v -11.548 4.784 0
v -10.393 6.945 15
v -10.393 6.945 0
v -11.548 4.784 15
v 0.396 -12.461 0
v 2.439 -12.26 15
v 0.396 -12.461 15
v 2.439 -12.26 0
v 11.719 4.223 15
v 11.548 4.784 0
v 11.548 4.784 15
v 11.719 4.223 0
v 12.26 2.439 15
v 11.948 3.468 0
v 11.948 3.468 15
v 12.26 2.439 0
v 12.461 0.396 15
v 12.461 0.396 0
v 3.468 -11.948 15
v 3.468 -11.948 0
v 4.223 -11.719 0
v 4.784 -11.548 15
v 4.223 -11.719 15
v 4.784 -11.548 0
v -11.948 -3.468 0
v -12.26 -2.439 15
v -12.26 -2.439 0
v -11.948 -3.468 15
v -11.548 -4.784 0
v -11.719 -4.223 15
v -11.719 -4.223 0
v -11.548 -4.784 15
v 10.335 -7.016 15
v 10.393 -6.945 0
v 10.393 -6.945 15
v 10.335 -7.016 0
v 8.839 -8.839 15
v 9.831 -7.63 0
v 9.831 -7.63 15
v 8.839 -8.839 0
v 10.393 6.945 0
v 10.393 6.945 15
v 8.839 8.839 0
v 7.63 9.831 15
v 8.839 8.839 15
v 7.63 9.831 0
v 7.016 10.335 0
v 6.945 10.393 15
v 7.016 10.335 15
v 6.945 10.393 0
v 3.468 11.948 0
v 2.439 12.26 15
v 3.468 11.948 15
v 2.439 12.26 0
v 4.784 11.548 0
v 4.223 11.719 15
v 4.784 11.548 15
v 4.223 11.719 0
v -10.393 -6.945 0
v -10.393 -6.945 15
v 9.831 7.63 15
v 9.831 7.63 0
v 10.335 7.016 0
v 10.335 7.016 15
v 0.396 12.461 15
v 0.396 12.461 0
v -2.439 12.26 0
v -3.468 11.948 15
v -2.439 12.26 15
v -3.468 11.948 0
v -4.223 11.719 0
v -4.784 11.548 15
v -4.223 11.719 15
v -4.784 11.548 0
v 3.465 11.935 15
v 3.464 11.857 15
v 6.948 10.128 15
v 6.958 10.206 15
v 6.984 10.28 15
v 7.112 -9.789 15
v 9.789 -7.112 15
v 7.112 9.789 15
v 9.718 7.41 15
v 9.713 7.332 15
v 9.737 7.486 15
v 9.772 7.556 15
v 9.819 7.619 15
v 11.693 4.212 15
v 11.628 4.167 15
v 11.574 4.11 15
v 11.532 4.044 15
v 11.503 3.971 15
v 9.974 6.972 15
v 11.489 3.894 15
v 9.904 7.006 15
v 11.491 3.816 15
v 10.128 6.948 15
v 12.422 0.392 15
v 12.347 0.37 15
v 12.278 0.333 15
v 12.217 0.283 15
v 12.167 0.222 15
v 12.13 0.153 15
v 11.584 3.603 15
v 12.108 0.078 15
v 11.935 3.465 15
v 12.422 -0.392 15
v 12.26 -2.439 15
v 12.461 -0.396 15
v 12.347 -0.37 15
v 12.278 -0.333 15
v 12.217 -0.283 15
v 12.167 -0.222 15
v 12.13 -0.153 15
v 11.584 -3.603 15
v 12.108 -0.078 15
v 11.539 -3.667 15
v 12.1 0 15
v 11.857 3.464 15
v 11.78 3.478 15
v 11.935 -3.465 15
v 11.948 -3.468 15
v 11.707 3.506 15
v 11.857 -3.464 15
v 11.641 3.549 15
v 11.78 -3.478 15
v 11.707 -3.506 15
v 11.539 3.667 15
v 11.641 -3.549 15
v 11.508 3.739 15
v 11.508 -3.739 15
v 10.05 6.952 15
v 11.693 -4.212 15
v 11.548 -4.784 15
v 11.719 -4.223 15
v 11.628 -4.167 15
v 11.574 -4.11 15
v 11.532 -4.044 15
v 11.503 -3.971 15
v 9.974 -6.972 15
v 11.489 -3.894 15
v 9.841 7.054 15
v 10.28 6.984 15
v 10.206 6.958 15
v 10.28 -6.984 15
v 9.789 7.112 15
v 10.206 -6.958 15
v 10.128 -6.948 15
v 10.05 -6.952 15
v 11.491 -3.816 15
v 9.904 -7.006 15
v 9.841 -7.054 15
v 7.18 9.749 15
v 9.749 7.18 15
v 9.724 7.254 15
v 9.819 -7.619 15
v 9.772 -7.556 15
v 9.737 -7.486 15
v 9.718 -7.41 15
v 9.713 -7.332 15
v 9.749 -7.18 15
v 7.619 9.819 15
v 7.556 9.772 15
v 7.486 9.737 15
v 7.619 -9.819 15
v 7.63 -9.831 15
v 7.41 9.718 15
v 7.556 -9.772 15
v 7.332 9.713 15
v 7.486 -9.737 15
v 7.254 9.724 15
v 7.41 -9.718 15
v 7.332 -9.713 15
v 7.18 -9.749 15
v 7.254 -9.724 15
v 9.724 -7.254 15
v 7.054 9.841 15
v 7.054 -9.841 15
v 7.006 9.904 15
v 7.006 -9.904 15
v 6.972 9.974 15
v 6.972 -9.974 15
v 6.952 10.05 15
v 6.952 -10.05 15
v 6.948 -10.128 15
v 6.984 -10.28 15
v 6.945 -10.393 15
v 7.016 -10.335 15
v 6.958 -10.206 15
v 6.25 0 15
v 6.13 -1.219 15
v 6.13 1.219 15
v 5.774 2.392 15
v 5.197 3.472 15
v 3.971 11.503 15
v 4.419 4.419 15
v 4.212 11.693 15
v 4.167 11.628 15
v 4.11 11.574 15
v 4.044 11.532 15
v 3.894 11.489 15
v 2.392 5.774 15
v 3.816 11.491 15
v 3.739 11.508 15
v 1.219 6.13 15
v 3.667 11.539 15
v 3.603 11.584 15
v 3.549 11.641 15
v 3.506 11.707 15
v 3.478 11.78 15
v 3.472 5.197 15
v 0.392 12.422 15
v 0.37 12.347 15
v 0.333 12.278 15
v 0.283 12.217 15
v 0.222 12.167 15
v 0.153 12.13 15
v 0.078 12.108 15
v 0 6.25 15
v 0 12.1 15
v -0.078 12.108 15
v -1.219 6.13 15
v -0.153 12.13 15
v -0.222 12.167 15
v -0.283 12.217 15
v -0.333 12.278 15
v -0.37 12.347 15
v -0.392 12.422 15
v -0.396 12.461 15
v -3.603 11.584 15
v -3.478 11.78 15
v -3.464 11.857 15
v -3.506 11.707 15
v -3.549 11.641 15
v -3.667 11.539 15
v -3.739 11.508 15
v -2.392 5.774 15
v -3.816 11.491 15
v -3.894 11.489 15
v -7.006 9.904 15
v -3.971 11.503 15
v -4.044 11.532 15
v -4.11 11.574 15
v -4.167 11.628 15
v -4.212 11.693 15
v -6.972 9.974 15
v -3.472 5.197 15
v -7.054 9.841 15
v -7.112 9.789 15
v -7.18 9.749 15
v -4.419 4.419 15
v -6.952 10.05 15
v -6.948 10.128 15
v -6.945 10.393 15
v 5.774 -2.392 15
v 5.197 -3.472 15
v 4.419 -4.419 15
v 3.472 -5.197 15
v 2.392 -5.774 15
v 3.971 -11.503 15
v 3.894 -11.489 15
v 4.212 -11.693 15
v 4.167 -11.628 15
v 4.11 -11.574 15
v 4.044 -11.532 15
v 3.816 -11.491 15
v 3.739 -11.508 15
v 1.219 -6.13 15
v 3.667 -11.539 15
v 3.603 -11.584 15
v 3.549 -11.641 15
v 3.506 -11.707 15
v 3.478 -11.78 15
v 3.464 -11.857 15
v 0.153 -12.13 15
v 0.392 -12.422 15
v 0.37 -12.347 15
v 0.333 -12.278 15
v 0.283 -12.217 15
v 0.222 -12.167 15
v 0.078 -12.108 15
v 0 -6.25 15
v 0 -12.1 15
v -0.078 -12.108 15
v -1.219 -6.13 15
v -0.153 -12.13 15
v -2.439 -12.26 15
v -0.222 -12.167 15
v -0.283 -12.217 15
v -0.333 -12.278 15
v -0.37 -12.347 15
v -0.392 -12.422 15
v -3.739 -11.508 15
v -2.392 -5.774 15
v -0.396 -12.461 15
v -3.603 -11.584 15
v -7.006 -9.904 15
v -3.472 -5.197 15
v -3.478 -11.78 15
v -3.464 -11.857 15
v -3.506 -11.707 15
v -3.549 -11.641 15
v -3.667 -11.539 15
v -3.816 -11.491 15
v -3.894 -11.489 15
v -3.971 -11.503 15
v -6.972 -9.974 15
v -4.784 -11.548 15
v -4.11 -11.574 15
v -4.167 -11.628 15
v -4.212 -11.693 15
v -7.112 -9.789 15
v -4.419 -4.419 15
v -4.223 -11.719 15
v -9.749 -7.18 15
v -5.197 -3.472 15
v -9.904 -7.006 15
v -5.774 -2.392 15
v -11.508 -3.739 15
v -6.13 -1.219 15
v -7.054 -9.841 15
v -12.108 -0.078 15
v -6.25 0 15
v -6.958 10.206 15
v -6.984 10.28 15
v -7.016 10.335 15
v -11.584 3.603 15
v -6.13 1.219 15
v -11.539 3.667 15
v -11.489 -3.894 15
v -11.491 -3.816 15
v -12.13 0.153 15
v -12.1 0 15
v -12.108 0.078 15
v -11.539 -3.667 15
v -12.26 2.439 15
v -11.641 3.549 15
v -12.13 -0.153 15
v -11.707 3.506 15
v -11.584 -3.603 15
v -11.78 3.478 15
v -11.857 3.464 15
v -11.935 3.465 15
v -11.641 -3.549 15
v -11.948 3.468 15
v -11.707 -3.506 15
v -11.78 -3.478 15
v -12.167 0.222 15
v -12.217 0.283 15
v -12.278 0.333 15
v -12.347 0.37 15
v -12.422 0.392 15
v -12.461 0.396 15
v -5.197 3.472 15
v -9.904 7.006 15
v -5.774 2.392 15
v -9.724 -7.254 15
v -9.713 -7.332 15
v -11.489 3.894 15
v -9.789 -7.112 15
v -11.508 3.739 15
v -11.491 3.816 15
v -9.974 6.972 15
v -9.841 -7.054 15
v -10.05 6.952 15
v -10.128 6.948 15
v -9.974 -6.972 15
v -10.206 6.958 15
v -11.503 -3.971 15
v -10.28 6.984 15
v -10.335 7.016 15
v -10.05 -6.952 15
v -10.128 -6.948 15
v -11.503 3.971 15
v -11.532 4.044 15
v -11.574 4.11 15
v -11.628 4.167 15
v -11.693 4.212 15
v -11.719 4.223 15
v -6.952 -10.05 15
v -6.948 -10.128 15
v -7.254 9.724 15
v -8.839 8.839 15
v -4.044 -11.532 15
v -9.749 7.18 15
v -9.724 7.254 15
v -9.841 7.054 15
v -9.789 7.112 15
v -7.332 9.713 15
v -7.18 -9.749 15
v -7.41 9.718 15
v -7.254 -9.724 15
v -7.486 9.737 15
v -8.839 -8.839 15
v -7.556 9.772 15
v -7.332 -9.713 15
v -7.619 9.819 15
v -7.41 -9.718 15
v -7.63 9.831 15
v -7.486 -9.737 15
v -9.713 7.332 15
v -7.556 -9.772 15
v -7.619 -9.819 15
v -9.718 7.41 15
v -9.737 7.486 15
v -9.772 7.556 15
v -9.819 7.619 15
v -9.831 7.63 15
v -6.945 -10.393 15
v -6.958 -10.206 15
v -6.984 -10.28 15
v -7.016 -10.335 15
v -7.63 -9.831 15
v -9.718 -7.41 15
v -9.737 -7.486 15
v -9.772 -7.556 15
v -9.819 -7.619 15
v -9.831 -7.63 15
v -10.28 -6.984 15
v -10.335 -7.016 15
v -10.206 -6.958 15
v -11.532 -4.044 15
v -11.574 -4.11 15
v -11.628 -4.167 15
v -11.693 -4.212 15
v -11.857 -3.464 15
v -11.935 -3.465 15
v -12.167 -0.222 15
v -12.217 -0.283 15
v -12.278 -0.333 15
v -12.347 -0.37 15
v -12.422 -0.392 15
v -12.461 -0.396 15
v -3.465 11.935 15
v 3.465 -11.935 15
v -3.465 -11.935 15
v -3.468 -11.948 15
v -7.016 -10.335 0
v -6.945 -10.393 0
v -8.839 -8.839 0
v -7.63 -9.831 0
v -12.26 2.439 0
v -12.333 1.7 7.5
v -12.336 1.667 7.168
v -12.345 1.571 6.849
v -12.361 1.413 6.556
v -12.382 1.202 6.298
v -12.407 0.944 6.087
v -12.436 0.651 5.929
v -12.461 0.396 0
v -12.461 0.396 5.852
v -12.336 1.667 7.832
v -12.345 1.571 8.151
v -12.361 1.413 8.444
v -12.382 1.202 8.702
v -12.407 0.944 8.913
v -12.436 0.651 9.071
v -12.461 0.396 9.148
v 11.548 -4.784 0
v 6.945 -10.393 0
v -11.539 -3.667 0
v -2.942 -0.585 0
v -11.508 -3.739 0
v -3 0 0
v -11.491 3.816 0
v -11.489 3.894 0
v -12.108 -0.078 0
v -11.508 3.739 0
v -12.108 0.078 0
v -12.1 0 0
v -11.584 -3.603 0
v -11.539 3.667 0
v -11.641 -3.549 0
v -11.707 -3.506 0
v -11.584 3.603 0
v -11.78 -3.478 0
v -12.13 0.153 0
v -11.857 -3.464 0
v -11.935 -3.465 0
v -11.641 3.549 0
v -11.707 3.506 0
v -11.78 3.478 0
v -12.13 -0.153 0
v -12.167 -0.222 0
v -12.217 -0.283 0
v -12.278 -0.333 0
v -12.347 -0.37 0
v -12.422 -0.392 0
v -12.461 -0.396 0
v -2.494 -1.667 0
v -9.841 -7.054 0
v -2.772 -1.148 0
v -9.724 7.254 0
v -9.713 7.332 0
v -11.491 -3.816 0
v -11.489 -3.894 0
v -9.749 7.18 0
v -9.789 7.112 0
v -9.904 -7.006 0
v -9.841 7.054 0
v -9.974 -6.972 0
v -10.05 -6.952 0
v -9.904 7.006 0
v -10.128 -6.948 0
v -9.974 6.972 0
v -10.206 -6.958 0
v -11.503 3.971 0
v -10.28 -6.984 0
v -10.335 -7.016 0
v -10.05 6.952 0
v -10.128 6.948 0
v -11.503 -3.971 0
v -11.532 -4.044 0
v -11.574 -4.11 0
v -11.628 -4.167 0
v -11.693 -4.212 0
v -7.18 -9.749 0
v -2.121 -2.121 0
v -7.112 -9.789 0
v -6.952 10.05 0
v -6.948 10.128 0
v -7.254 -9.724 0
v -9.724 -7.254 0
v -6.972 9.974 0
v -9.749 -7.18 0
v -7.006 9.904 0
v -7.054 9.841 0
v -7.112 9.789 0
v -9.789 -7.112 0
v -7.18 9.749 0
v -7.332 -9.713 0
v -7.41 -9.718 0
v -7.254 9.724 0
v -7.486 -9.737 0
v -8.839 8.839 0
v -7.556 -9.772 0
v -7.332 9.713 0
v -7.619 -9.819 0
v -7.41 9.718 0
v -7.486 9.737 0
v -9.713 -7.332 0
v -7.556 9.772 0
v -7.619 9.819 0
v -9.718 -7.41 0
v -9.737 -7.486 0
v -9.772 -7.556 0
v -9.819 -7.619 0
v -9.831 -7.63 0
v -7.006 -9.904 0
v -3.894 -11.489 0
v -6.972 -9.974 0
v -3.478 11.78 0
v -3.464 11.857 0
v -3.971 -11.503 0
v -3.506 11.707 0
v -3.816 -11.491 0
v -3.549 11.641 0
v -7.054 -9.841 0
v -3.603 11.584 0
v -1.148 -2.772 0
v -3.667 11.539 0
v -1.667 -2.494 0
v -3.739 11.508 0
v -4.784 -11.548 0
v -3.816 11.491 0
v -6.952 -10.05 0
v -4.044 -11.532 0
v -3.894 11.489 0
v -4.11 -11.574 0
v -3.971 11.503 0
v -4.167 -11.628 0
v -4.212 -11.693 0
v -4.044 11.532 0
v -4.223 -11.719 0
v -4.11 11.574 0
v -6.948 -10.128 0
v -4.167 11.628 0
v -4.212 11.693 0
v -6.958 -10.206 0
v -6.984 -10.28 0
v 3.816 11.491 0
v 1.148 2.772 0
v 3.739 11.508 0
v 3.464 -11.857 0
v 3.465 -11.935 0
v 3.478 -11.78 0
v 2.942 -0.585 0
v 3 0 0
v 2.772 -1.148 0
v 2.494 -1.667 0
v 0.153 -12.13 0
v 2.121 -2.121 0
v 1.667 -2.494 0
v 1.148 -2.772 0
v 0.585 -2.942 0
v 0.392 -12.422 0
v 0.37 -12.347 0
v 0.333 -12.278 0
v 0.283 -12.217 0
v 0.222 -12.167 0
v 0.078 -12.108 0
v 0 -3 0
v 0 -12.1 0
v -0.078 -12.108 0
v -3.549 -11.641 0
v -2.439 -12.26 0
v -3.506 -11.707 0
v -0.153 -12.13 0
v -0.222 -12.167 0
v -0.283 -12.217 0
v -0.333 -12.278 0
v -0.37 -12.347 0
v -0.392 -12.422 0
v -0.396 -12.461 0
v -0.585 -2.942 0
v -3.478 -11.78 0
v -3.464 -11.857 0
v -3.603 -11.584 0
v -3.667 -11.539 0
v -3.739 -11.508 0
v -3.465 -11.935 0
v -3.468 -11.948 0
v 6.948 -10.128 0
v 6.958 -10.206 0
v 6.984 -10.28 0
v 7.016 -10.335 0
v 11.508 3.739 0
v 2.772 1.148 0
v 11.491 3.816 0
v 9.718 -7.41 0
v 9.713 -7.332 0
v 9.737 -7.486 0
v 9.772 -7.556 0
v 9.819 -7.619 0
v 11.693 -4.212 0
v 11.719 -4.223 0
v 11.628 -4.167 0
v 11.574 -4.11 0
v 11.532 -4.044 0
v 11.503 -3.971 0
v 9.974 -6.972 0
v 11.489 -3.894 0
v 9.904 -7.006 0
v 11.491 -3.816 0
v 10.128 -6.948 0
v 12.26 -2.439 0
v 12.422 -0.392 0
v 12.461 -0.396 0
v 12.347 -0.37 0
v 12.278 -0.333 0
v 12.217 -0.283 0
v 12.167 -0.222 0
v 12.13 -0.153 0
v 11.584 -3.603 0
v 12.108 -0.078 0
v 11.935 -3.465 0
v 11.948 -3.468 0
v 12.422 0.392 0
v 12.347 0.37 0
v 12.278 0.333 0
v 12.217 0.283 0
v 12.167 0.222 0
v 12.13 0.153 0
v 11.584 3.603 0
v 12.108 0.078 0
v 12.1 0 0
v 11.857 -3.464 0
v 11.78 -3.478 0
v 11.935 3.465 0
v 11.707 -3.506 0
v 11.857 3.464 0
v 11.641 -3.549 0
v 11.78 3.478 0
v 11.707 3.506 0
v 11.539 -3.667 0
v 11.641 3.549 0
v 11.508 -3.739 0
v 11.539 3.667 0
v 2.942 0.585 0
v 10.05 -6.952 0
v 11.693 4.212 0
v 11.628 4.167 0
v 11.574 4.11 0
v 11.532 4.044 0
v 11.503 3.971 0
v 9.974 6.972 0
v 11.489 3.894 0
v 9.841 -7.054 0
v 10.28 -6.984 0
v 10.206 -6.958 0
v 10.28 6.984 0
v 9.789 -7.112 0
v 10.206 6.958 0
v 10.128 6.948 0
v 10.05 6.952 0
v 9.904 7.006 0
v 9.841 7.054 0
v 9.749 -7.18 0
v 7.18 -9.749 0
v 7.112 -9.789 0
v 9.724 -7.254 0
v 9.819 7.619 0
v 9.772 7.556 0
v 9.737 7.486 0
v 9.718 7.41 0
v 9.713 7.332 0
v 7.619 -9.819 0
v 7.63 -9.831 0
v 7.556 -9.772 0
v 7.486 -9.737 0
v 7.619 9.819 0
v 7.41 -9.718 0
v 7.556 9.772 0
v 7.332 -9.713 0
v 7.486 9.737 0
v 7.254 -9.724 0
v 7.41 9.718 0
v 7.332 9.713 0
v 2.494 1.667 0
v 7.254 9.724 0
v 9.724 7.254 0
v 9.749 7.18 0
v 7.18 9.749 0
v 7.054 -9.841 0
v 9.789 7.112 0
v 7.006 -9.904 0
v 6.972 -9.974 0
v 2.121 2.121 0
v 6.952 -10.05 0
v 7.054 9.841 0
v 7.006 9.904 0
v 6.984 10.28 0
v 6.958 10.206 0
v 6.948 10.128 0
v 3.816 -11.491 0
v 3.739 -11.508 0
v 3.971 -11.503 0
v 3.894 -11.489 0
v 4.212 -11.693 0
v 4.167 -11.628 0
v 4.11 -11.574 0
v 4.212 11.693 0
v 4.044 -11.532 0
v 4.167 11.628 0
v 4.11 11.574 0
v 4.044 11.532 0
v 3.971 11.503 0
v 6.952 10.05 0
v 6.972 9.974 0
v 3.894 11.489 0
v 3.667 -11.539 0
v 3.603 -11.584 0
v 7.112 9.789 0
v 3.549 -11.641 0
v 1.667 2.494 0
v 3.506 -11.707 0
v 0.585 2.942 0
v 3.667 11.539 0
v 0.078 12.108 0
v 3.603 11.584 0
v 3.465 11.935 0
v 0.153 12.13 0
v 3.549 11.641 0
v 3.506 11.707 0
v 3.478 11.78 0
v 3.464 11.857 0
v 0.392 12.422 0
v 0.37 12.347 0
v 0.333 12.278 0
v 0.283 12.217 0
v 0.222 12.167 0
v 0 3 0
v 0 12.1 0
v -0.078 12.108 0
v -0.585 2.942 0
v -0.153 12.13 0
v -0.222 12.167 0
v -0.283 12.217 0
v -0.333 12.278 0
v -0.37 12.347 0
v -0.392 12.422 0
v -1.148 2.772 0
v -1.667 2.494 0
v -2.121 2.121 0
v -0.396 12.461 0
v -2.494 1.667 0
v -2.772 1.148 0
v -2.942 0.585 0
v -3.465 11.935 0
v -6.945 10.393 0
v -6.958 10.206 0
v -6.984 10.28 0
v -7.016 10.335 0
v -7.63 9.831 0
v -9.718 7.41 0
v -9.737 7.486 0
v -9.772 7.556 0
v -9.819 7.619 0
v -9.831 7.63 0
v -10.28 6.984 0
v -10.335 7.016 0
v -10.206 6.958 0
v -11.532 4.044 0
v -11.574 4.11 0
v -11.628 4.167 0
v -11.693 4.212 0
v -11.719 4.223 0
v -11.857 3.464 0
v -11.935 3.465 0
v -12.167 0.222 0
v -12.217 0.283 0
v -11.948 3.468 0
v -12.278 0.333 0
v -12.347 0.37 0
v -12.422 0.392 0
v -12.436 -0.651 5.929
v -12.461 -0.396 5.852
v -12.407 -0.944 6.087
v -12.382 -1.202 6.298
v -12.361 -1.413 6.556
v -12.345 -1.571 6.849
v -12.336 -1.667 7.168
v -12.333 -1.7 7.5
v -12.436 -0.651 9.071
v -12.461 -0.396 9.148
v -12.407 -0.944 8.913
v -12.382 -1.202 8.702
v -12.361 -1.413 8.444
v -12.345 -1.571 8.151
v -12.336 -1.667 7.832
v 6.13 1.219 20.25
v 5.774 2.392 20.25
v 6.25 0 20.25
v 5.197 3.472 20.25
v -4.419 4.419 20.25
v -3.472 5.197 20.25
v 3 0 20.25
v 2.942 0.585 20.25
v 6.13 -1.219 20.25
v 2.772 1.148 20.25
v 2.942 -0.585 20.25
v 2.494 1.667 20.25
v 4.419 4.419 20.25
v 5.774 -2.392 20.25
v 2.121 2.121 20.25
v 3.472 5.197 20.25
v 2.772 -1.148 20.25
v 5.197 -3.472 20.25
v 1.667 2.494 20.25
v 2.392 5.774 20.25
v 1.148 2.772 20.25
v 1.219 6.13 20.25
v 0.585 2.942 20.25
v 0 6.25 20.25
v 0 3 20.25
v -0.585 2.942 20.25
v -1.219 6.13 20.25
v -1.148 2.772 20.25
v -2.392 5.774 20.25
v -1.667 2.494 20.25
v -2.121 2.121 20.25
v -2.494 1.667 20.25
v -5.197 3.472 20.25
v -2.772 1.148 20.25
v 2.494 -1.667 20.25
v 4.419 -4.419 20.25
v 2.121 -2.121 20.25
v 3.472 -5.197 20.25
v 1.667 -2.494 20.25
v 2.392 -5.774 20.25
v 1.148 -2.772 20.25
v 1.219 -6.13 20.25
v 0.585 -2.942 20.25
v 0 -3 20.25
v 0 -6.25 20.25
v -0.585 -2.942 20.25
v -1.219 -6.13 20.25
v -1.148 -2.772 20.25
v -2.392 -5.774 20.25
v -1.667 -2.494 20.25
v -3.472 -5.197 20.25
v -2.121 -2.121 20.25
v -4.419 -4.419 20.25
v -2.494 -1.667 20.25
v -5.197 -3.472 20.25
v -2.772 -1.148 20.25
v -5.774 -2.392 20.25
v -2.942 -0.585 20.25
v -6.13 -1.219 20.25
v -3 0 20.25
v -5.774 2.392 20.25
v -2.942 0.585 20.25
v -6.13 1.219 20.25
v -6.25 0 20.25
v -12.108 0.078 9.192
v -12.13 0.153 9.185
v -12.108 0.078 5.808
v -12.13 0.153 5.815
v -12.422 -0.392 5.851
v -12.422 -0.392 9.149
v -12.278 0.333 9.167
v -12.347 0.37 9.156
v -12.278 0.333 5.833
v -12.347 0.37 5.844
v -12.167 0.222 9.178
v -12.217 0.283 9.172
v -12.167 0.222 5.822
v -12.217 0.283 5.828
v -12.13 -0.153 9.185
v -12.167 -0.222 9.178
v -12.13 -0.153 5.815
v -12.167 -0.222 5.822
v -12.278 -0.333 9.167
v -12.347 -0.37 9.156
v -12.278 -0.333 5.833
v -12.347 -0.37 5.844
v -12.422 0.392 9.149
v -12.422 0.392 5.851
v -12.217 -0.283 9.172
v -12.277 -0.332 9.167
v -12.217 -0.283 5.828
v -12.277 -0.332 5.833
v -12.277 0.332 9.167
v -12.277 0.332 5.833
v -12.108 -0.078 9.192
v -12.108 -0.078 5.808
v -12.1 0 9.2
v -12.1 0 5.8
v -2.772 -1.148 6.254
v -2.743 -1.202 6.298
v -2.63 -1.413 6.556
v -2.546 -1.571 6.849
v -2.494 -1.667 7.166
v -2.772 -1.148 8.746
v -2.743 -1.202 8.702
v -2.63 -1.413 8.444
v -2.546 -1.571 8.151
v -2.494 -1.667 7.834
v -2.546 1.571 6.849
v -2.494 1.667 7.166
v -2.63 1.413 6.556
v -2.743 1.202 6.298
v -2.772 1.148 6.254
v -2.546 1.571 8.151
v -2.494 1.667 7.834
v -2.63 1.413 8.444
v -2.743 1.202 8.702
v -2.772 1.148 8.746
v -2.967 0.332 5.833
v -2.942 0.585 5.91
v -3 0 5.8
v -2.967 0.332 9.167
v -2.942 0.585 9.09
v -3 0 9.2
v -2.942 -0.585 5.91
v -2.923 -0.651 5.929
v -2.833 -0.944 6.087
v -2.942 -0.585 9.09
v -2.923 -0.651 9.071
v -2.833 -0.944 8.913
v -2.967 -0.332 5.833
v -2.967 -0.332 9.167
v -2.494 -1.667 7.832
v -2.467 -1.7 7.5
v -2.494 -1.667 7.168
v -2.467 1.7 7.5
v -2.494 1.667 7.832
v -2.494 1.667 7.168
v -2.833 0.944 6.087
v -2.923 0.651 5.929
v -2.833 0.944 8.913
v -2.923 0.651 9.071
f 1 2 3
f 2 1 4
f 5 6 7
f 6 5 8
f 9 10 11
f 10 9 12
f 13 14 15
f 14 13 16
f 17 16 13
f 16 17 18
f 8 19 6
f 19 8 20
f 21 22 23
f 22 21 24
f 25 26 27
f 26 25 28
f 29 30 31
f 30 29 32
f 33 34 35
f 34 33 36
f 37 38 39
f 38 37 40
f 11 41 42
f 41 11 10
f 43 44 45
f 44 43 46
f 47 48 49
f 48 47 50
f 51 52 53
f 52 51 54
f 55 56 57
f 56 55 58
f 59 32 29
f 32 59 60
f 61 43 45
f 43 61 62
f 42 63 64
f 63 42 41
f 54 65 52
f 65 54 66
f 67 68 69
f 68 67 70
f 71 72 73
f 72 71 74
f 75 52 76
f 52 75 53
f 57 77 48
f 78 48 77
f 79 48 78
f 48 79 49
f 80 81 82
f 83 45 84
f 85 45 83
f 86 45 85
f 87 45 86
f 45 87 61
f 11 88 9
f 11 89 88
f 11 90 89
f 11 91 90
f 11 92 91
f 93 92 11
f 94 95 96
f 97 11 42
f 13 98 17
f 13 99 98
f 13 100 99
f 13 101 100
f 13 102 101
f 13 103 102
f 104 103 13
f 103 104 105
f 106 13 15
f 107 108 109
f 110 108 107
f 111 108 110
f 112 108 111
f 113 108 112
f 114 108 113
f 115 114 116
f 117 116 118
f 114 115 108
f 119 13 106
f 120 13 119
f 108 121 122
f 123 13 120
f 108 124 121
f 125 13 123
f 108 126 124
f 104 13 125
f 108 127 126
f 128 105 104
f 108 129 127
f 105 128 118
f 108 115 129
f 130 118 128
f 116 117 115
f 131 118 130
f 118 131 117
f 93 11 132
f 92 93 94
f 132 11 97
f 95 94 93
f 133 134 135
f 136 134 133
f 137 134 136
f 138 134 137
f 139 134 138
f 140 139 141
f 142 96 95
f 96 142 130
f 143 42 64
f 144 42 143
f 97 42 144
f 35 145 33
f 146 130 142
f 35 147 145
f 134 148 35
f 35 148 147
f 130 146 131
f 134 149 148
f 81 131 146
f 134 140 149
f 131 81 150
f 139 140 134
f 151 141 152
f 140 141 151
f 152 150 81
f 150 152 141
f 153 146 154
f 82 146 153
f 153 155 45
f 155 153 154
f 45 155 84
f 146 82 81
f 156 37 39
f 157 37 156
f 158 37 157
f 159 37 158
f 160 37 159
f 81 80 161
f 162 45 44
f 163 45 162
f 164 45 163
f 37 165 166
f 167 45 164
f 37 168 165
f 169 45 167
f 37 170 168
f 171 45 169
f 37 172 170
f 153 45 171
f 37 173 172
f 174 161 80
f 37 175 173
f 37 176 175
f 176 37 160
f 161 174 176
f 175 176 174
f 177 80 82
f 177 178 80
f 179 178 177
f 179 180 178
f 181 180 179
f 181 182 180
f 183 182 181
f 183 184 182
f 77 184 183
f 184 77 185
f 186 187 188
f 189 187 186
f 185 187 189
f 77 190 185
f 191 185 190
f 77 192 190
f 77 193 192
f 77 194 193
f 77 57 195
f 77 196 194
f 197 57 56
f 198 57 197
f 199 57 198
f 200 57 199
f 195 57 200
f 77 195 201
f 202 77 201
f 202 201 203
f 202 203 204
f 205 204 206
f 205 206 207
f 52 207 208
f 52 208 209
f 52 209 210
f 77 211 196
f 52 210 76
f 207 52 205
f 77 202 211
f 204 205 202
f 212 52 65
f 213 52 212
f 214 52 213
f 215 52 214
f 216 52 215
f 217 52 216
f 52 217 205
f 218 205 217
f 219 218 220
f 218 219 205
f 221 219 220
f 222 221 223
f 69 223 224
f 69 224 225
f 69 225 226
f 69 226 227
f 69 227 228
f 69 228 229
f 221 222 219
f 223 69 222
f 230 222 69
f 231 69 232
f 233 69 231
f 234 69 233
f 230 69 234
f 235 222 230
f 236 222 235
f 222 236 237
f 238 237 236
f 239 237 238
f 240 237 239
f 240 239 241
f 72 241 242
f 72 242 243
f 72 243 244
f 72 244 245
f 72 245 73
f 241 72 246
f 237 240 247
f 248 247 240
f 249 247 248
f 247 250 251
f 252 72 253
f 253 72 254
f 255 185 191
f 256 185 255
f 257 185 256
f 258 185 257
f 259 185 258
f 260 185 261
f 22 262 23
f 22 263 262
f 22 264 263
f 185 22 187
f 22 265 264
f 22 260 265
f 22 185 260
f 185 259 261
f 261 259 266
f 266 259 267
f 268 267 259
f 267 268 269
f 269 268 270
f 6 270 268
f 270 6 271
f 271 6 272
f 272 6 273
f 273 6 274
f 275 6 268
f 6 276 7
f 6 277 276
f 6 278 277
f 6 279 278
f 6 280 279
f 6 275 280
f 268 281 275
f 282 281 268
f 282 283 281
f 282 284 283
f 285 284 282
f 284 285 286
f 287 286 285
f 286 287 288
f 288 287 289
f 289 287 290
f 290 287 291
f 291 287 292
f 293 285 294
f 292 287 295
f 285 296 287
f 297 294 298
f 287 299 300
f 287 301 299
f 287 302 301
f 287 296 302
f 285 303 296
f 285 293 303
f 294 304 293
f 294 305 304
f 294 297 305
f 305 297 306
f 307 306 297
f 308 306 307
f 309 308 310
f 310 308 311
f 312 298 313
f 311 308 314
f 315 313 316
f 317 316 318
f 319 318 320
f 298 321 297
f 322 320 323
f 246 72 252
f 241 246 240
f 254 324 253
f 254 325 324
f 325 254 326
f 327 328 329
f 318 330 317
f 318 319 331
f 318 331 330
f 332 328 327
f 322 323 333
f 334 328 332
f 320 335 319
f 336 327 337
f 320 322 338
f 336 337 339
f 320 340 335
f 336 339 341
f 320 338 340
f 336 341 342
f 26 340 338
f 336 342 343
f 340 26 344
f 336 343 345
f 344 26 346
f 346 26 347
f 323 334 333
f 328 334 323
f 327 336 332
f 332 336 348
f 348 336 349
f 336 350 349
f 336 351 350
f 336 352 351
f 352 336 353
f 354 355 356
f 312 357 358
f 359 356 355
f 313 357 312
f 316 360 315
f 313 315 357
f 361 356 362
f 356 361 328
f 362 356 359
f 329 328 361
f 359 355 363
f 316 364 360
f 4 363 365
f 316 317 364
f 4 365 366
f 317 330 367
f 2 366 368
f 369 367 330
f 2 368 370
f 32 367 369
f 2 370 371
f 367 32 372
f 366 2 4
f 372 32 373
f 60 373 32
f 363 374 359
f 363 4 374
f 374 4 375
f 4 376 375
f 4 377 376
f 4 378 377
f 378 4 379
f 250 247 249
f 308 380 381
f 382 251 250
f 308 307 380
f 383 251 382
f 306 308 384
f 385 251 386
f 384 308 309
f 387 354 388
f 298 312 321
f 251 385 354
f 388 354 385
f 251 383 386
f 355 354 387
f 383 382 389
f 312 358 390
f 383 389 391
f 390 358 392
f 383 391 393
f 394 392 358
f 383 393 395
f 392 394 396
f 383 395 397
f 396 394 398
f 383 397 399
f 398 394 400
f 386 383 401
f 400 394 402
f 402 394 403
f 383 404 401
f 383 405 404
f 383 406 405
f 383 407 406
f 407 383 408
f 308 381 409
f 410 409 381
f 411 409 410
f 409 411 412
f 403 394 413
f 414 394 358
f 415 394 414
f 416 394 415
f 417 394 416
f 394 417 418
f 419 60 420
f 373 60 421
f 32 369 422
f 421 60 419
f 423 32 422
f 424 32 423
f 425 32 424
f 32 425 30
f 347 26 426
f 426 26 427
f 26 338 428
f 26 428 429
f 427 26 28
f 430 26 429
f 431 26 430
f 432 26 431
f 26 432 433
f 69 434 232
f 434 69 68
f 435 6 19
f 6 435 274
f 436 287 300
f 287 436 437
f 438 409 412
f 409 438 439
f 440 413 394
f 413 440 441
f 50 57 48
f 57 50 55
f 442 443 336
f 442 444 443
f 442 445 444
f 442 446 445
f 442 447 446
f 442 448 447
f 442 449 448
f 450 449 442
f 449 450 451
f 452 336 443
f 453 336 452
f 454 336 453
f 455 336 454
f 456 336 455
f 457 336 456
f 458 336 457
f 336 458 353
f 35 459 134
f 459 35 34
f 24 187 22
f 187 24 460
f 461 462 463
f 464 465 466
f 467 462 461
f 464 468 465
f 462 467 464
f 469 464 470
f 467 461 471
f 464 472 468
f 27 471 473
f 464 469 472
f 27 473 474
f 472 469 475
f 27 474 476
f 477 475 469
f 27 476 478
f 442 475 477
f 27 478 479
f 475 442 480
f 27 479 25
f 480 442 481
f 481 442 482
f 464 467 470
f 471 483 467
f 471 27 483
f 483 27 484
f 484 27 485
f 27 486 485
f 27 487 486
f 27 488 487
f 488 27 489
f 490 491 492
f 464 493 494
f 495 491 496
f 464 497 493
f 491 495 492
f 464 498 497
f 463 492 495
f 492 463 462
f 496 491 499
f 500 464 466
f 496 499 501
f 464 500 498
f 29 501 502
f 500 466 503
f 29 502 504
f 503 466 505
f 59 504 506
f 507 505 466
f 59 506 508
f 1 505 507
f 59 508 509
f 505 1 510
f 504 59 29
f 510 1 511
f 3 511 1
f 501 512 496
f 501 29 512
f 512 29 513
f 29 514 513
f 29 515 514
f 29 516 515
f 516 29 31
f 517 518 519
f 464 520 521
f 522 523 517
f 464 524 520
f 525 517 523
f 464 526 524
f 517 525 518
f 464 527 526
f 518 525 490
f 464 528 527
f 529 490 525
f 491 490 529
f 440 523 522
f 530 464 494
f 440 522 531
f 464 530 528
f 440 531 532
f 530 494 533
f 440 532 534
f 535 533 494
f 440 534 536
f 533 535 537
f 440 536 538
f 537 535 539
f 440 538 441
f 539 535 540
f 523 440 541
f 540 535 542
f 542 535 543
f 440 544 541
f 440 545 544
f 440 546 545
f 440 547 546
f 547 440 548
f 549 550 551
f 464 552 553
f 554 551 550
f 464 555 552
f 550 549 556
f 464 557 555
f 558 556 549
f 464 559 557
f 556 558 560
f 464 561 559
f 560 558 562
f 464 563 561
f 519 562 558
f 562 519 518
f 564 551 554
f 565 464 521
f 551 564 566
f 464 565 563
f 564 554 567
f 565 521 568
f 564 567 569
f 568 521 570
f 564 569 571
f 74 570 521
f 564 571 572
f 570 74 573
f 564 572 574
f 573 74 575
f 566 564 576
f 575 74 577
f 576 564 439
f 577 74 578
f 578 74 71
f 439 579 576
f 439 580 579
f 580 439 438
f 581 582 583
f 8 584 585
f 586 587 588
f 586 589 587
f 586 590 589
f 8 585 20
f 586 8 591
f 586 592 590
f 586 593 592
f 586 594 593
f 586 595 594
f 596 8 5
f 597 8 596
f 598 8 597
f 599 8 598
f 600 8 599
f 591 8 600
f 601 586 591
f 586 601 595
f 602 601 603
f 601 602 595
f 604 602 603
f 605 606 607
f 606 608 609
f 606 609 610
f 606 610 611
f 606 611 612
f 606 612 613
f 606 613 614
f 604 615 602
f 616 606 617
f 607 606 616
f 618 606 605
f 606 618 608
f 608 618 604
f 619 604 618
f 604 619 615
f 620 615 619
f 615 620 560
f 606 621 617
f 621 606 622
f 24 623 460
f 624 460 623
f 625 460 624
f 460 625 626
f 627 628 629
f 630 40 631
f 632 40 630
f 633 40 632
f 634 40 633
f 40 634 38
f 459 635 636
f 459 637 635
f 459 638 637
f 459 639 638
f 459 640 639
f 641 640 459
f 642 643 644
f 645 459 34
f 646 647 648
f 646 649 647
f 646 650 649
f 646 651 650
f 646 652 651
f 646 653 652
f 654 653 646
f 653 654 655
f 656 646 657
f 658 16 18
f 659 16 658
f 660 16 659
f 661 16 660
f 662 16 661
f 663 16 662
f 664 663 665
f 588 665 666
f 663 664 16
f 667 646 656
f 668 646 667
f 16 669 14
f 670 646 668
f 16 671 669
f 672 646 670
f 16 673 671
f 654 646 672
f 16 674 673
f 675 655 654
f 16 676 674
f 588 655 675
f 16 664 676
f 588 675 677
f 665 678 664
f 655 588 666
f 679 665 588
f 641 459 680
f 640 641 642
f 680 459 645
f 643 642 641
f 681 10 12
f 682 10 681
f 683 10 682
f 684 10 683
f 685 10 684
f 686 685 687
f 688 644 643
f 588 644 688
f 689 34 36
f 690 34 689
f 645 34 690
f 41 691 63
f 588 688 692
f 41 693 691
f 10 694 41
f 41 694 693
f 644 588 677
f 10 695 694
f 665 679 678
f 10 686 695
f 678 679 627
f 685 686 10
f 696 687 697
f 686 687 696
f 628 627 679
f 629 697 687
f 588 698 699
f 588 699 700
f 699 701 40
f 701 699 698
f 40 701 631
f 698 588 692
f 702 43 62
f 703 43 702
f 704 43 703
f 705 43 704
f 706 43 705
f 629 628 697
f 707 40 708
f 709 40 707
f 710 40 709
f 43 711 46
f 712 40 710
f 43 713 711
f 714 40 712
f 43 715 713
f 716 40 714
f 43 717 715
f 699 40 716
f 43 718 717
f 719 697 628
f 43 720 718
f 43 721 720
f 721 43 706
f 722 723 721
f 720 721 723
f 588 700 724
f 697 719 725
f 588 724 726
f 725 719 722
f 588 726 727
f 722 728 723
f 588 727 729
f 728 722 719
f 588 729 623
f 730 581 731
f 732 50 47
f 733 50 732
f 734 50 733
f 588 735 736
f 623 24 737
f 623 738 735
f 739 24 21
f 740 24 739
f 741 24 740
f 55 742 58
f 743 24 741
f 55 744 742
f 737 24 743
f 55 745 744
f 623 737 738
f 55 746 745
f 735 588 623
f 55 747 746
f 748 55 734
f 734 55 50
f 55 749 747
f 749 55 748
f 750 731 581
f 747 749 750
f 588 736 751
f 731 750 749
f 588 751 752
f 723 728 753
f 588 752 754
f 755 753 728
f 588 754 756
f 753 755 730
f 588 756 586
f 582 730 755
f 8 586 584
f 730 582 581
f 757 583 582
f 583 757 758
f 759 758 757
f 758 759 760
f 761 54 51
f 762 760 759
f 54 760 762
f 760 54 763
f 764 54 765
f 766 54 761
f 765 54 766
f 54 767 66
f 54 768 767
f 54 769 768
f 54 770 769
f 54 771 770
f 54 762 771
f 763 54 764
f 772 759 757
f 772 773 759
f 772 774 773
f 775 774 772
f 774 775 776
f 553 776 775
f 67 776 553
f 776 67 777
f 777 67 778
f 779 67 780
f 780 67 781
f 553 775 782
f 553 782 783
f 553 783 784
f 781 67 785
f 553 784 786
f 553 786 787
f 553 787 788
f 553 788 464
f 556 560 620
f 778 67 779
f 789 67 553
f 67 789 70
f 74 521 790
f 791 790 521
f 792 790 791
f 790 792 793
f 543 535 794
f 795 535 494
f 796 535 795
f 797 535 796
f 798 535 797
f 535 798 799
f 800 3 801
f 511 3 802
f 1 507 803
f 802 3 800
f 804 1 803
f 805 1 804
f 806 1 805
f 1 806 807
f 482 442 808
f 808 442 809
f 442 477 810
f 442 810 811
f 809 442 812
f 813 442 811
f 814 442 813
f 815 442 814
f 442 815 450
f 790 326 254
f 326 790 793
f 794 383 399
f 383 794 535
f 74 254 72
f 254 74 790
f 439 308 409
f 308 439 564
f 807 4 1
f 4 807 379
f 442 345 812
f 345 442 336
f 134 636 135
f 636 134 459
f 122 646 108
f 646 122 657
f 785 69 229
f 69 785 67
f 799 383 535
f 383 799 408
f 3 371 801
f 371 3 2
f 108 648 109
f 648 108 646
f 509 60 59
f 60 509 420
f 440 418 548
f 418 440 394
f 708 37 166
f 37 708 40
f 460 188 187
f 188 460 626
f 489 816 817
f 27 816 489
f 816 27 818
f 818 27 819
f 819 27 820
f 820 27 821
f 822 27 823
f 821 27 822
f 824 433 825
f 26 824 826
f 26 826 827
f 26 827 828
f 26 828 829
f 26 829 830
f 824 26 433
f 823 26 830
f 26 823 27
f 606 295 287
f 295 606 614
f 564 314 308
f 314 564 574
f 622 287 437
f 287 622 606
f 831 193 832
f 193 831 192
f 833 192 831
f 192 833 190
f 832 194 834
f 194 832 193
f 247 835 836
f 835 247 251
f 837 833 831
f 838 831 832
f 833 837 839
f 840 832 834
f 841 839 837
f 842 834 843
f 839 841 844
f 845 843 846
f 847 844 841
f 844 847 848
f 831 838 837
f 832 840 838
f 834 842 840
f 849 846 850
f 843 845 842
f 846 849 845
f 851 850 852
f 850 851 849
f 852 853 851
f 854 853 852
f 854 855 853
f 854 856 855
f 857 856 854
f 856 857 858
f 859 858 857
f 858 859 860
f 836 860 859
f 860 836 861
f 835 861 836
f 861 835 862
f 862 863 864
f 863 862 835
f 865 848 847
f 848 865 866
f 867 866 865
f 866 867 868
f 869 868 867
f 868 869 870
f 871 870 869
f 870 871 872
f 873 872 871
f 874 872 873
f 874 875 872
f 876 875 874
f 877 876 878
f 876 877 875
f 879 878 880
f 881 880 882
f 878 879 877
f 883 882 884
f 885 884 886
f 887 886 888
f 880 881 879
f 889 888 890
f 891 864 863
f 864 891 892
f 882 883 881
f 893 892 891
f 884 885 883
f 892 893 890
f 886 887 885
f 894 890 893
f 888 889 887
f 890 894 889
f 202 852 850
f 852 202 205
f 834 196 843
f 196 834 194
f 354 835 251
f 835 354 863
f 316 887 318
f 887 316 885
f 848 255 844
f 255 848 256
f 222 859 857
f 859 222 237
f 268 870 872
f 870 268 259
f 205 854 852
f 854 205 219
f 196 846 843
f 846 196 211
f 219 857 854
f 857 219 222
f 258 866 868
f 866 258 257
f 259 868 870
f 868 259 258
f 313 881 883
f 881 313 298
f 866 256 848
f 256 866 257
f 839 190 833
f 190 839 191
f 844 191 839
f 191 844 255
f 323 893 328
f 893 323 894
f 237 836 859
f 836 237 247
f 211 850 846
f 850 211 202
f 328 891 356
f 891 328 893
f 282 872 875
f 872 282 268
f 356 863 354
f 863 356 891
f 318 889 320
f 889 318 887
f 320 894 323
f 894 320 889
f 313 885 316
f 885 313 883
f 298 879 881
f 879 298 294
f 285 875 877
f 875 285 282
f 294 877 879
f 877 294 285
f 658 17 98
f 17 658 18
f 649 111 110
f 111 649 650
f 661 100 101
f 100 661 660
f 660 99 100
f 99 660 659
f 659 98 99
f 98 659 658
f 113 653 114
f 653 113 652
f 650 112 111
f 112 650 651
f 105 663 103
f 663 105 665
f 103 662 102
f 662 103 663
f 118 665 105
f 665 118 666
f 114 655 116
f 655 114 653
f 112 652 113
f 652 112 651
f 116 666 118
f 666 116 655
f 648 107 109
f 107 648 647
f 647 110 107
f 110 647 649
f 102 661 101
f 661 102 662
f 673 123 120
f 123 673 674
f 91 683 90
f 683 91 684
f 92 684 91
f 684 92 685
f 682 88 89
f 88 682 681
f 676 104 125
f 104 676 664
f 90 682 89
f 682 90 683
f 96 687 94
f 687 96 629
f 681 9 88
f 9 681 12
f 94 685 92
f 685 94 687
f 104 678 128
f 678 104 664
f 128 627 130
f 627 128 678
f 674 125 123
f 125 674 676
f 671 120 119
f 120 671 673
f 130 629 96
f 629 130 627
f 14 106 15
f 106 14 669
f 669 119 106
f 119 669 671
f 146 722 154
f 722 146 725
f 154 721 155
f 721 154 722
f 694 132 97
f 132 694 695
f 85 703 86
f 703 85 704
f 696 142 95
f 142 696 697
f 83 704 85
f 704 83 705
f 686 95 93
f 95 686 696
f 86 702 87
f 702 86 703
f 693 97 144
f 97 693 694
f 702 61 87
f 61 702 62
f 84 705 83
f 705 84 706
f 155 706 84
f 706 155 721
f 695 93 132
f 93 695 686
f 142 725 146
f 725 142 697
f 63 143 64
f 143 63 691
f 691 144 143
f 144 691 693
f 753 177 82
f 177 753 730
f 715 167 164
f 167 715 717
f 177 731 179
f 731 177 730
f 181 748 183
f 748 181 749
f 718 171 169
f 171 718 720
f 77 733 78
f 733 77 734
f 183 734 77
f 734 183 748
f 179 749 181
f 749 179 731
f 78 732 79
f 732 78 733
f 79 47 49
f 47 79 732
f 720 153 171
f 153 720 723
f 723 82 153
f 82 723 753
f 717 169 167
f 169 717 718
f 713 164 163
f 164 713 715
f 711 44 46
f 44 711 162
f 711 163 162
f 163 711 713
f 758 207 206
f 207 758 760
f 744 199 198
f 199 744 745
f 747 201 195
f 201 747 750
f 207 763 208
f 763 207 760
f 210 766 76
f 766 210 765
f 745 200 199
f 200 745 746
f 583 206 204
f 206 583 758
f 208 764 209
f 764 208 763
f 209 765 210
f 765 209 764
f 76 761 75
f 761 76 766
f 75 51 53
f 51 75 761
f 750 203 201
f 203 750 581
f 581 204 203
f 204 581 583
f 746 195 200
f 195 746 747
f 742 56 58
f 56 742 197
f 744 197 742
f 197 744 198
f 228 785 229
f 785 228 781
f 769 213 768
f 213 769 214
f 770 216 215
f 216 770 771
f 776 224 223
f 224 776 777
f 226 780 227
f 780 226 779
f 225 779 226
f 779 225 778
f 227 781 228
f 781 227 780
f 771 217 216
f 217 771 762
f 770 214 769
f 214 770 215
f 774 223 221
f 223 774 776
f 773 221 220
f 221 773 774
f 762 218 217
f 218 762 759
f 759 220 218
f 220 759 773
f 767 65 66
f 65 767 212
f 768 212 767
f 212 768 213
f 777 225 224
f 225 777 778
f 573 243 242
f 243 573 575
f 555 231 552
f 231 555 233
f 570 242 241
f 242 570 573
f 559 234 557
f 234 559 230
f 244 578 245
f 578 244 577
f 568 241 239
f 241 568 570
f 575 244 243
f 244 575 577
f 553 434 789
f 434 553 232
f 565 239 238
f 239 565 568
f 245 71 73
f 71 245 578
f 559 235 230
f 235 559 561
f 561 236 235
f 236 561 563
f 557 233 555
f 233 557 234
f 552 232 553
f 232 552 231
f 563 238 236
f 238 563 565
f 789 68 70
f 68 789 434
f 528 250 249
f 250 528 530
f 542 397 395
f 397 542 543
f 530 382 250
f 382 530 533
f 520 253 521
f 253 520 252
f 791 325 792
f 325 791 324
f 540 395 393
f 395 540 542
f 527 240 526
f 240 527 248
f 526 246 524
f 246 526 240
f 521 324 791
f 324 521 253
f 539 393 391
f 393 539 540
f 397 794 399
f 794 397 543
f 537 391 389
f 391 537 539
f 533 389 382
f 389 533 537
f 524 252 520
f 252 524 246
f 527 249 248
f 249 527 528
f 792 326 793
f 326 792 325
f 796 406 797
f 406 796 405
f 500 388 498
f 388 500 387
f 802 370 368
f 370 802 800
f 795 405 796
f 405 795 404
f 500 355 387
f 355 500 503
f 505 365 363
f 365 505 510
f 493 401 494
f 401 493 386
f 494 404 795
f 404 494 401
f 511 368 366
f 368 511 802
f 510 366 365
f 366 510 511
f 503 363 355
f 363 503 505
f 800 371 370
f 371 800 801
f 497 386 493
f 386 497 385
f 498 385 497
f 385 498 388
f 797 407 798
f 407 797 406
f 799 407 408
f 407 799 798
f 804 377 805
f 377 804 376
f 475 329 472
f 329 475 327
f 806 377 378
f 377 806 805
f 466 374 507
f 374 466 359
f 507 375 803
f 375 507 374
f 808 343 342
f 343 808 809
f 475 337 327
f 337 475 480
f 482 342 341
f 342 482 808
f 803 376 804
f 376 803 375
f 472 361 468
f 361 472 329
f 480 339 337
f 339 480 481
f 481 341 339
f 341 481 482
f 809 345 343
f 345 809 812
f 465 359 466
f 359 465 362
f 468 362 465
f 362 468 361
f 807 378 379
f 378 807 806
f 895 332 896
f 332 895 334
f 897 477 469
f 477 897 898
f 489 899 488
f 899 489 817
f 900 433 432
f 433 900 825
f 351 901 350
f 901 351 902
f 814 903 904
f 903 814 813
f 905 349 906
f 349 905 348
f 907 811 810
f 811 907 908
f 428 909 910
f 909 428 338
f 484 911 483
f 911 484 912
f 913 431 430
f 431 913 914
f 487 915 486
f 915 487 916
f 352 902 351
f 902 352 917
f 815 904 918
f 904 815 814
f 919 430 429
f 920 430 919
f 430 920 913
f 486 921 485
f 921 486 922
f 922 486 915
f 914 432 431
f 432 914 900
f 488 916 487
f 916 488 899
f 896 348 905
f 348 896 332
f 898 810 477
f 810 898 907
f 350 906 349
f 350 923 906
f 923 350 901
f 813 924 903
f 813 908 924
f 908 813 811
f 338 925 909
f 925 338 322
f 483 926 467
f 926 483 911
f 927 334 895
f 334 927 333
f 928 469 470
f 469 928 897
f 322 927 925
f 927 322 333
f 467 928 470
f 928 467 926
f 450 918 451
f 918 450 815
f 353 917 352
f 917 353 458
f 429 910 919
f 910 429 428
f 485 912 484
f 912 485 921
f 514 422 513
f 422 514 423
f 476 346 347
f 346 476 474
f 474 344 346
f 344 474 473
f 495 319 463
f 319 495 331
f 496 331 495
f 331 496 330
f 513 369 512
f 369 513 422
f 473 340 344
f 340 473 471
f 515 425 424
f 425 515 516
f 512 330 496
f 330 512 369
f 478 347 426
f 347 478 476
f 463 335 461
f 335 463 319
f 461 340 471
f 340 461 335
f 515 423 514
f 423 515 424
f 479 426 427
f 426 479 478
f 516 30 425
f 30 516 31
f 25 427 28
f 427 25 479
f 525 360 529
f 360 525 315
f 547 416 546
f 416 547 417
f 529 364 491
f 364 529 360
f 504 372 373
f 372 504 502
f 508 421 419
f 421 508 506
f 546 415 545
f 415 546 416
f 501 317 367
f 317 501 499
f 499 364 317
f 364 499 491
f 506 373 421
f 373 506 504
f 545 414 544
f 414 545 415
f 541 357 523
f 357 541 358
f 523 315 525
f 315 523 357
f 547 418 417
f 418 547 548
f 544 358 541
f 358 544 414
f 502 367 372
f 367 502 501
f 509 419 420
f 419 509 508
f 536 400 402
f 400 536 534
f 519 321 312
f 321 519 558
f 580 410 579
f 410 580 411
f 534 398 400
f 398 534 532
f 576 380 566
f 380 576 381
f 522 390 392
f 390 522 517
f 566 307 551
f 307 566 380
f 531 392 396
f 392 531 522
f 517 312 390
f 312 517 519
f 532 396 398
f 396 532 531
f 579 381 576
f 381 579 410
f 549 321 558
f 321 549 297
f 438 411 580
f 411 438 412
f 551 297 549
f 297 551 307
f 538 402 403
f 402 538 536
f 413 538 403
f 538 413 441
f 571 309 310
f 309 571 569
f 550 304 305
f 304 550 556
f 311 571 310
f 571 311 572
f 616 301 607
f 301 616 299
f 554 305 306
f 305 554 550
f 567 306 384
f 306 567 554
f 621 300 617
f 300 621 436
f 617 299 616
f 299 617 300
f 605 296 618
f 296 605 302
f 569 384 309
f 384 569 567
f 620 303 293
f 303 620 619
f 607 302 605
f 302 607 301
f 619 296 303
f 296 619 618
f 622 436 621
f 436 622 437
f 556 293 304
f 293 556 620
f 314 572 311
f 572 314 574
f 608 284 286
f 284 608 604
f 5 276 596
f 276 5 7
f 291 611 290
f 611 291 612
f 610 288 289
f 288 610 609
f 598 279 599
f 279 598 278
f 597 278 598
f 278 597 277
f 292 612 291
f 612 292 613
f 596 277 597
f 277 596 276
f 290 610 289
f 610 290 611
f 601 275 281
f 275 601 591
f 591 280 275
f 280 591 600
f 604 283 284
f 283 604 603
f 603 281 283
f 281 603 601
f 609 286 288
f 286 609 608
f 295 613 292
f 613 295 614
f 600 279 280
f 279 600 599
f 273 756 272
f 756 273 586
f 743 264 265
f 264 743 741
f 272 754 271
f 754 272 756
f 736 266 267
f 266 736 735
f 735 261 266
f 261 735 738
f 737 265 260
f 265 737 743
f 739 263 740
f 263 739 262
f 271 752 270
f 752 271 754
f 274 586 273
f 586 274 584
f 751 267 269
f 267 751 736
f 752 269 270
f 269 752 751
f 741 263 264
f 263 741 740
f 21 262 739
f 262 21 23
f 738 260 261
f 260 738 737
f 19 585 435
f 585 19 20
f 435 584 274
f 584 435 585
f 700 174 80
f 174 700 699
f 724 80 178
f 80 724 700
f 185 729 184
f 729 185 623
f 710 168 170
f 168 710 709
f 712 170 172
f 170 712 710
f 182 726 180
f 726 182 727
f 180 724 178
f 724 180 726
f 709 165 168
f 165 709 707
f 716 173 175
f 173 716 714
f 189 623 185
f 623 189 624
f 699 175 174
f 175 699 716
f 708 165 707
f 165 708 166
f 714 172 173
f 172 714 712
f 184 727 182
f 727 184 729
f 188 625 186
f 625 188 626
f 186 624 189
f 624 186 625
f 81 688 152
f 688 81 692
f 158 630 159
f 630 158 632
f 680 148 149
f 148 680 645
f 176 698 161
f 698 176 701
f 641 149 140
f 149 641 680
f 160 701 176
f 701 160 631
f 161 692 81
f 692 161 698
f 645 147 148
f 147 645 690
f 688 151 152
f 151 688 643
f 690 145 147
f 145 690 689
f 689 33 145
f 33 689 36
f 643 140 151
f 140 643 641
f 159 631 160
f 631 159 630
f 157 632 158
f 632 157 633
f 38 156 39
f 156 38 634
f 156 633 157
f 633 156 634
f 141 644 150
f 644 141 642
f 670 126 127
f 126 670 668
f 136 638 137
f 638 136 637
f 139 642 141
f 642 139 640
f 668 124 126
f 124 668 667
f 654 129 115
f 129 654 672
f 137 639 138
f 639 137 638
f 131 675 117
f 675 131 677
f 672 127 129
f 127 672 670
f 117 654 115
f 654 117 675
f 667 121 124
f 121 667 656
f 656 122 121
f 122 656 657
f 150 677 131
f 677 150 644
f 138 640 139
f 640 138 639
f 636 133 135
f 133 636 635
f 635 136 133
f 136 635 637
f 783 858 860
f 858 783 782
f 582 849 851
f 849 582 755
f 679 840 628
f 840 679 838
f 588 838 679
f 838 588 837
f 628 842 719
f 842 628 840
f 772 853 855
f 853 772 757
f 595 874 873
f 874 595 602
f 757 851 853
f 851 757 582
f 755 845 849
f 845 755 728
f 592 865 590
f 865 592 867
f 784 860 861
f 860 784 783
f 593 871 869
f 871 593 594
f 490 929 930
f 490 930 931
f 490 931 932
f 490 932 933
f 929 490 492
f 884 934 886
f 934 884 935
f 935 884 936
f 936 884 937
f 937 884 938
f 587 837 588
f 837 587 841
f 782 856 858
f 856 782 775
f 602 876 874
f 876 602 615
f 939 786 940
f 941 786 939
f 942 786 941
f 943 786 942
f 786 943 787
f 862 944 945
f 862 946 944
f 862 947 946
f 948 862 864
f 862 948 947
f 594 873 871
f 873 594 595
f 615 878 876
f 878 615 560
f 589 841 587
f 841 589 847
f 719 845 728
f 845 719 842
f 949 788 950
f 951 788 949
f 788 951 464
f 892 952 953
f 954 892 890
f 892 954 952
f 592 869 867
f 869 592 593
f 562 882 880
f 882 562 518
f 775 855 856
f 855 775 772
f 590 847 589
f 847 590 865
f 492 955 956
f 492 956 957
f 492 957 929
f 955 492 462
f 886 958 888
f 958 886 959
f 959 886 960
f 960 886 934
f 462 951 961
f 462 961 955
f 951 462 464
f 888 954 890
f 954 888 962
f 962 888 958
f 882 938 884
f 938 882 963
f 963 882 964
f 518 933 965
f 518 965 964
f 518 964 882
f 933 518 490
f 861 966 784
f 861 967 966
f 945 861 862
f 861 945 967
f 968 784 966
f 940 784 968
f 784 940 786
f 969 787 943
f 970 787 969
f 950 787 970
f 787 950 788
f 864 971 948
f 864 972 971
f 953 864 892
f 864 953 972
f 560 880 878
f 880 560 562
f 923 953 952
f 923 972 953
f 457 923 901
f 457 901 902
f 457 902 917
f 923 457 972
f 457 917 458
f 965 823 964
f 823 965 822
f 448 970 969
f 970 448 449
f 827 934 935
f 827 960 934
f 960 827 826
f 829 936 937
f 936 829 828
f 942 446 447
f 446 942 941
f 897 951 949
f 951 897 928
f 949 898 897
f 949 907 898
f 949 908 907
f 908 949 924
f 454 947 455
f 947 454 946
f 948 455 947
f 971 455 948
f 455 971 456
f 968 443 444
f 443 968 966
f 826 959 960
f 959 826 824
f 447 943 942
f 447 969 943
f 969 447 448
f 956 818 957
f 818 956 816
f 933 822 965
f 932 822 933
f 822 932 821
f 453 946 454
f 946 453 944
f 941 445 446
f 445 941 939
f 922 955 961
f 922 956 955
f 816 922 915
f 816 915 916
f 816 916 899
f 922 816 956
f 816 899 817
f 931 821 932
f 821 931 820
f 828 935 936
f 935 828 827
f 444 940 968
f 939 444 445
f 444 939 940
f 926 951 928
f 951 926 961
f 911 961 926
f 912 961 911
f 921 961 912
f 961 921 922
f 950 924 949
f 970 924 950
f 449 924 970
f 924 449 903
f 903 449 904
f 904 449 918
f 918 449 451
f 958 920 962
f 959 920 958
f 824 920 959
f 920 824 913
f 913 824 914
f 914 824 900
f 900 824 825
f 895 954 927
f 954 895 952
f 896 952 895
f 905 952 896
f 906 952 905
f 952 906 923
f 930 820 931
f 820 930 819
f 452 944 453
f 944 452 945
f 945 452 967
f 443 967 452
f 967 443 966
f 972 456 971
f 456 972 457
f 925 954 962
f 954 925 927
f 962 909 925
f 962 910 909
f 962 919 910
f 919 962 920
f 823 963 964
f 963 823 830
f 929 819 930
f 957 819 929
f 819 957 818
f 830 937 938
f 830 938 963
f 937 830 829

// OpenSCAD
$fn = 32;

// ----------------------------------------------------------------------
// Hand knob: 25 x 25 x 20.25 mm
// ----------------------------------------------------------------------

// --- parameters (mm) ---
head_d = 25;              // knob diameter
head_h = 15;              // knob height
hole_d = 6;               // shaft bore
set_d = 3.4;              // set screw tap hole
notch_d = 0.8;            // knurl groove diameter
knurl_n = 20;             // number of knurl grooves
cap_h = 5.25;             // raised centre cap
cap_d = 12.5;             // centre cap diameter

module body() {
  cylinder(h = head_h, d = head_d);
}

module cap() {
  translate([0, 0, head_h - 1]) cylinder(h = cap_h + 1, d = cap_d);
}

difference() {
  union() {
    body();
    cap();
  }
  translate([0, 0, -1]) cylinder(h = head_h + cap_h + 2, d = hole_d);
  /* knurl grooves */
  for (i = [0 : knurl_n - 1])
    rotate([0, 0, i * 360 / knurl_n])
      translate([head_d / 2, 0, -0.5])
        cylinder(h = head_h + 1, d = notch_d);
  translate([-head_d / 2 - 1, 0, head_h * 0.5]) rotate([0, 90, 0]) cylinder(h = head_d / 2 + 2, d = set_d);
}
